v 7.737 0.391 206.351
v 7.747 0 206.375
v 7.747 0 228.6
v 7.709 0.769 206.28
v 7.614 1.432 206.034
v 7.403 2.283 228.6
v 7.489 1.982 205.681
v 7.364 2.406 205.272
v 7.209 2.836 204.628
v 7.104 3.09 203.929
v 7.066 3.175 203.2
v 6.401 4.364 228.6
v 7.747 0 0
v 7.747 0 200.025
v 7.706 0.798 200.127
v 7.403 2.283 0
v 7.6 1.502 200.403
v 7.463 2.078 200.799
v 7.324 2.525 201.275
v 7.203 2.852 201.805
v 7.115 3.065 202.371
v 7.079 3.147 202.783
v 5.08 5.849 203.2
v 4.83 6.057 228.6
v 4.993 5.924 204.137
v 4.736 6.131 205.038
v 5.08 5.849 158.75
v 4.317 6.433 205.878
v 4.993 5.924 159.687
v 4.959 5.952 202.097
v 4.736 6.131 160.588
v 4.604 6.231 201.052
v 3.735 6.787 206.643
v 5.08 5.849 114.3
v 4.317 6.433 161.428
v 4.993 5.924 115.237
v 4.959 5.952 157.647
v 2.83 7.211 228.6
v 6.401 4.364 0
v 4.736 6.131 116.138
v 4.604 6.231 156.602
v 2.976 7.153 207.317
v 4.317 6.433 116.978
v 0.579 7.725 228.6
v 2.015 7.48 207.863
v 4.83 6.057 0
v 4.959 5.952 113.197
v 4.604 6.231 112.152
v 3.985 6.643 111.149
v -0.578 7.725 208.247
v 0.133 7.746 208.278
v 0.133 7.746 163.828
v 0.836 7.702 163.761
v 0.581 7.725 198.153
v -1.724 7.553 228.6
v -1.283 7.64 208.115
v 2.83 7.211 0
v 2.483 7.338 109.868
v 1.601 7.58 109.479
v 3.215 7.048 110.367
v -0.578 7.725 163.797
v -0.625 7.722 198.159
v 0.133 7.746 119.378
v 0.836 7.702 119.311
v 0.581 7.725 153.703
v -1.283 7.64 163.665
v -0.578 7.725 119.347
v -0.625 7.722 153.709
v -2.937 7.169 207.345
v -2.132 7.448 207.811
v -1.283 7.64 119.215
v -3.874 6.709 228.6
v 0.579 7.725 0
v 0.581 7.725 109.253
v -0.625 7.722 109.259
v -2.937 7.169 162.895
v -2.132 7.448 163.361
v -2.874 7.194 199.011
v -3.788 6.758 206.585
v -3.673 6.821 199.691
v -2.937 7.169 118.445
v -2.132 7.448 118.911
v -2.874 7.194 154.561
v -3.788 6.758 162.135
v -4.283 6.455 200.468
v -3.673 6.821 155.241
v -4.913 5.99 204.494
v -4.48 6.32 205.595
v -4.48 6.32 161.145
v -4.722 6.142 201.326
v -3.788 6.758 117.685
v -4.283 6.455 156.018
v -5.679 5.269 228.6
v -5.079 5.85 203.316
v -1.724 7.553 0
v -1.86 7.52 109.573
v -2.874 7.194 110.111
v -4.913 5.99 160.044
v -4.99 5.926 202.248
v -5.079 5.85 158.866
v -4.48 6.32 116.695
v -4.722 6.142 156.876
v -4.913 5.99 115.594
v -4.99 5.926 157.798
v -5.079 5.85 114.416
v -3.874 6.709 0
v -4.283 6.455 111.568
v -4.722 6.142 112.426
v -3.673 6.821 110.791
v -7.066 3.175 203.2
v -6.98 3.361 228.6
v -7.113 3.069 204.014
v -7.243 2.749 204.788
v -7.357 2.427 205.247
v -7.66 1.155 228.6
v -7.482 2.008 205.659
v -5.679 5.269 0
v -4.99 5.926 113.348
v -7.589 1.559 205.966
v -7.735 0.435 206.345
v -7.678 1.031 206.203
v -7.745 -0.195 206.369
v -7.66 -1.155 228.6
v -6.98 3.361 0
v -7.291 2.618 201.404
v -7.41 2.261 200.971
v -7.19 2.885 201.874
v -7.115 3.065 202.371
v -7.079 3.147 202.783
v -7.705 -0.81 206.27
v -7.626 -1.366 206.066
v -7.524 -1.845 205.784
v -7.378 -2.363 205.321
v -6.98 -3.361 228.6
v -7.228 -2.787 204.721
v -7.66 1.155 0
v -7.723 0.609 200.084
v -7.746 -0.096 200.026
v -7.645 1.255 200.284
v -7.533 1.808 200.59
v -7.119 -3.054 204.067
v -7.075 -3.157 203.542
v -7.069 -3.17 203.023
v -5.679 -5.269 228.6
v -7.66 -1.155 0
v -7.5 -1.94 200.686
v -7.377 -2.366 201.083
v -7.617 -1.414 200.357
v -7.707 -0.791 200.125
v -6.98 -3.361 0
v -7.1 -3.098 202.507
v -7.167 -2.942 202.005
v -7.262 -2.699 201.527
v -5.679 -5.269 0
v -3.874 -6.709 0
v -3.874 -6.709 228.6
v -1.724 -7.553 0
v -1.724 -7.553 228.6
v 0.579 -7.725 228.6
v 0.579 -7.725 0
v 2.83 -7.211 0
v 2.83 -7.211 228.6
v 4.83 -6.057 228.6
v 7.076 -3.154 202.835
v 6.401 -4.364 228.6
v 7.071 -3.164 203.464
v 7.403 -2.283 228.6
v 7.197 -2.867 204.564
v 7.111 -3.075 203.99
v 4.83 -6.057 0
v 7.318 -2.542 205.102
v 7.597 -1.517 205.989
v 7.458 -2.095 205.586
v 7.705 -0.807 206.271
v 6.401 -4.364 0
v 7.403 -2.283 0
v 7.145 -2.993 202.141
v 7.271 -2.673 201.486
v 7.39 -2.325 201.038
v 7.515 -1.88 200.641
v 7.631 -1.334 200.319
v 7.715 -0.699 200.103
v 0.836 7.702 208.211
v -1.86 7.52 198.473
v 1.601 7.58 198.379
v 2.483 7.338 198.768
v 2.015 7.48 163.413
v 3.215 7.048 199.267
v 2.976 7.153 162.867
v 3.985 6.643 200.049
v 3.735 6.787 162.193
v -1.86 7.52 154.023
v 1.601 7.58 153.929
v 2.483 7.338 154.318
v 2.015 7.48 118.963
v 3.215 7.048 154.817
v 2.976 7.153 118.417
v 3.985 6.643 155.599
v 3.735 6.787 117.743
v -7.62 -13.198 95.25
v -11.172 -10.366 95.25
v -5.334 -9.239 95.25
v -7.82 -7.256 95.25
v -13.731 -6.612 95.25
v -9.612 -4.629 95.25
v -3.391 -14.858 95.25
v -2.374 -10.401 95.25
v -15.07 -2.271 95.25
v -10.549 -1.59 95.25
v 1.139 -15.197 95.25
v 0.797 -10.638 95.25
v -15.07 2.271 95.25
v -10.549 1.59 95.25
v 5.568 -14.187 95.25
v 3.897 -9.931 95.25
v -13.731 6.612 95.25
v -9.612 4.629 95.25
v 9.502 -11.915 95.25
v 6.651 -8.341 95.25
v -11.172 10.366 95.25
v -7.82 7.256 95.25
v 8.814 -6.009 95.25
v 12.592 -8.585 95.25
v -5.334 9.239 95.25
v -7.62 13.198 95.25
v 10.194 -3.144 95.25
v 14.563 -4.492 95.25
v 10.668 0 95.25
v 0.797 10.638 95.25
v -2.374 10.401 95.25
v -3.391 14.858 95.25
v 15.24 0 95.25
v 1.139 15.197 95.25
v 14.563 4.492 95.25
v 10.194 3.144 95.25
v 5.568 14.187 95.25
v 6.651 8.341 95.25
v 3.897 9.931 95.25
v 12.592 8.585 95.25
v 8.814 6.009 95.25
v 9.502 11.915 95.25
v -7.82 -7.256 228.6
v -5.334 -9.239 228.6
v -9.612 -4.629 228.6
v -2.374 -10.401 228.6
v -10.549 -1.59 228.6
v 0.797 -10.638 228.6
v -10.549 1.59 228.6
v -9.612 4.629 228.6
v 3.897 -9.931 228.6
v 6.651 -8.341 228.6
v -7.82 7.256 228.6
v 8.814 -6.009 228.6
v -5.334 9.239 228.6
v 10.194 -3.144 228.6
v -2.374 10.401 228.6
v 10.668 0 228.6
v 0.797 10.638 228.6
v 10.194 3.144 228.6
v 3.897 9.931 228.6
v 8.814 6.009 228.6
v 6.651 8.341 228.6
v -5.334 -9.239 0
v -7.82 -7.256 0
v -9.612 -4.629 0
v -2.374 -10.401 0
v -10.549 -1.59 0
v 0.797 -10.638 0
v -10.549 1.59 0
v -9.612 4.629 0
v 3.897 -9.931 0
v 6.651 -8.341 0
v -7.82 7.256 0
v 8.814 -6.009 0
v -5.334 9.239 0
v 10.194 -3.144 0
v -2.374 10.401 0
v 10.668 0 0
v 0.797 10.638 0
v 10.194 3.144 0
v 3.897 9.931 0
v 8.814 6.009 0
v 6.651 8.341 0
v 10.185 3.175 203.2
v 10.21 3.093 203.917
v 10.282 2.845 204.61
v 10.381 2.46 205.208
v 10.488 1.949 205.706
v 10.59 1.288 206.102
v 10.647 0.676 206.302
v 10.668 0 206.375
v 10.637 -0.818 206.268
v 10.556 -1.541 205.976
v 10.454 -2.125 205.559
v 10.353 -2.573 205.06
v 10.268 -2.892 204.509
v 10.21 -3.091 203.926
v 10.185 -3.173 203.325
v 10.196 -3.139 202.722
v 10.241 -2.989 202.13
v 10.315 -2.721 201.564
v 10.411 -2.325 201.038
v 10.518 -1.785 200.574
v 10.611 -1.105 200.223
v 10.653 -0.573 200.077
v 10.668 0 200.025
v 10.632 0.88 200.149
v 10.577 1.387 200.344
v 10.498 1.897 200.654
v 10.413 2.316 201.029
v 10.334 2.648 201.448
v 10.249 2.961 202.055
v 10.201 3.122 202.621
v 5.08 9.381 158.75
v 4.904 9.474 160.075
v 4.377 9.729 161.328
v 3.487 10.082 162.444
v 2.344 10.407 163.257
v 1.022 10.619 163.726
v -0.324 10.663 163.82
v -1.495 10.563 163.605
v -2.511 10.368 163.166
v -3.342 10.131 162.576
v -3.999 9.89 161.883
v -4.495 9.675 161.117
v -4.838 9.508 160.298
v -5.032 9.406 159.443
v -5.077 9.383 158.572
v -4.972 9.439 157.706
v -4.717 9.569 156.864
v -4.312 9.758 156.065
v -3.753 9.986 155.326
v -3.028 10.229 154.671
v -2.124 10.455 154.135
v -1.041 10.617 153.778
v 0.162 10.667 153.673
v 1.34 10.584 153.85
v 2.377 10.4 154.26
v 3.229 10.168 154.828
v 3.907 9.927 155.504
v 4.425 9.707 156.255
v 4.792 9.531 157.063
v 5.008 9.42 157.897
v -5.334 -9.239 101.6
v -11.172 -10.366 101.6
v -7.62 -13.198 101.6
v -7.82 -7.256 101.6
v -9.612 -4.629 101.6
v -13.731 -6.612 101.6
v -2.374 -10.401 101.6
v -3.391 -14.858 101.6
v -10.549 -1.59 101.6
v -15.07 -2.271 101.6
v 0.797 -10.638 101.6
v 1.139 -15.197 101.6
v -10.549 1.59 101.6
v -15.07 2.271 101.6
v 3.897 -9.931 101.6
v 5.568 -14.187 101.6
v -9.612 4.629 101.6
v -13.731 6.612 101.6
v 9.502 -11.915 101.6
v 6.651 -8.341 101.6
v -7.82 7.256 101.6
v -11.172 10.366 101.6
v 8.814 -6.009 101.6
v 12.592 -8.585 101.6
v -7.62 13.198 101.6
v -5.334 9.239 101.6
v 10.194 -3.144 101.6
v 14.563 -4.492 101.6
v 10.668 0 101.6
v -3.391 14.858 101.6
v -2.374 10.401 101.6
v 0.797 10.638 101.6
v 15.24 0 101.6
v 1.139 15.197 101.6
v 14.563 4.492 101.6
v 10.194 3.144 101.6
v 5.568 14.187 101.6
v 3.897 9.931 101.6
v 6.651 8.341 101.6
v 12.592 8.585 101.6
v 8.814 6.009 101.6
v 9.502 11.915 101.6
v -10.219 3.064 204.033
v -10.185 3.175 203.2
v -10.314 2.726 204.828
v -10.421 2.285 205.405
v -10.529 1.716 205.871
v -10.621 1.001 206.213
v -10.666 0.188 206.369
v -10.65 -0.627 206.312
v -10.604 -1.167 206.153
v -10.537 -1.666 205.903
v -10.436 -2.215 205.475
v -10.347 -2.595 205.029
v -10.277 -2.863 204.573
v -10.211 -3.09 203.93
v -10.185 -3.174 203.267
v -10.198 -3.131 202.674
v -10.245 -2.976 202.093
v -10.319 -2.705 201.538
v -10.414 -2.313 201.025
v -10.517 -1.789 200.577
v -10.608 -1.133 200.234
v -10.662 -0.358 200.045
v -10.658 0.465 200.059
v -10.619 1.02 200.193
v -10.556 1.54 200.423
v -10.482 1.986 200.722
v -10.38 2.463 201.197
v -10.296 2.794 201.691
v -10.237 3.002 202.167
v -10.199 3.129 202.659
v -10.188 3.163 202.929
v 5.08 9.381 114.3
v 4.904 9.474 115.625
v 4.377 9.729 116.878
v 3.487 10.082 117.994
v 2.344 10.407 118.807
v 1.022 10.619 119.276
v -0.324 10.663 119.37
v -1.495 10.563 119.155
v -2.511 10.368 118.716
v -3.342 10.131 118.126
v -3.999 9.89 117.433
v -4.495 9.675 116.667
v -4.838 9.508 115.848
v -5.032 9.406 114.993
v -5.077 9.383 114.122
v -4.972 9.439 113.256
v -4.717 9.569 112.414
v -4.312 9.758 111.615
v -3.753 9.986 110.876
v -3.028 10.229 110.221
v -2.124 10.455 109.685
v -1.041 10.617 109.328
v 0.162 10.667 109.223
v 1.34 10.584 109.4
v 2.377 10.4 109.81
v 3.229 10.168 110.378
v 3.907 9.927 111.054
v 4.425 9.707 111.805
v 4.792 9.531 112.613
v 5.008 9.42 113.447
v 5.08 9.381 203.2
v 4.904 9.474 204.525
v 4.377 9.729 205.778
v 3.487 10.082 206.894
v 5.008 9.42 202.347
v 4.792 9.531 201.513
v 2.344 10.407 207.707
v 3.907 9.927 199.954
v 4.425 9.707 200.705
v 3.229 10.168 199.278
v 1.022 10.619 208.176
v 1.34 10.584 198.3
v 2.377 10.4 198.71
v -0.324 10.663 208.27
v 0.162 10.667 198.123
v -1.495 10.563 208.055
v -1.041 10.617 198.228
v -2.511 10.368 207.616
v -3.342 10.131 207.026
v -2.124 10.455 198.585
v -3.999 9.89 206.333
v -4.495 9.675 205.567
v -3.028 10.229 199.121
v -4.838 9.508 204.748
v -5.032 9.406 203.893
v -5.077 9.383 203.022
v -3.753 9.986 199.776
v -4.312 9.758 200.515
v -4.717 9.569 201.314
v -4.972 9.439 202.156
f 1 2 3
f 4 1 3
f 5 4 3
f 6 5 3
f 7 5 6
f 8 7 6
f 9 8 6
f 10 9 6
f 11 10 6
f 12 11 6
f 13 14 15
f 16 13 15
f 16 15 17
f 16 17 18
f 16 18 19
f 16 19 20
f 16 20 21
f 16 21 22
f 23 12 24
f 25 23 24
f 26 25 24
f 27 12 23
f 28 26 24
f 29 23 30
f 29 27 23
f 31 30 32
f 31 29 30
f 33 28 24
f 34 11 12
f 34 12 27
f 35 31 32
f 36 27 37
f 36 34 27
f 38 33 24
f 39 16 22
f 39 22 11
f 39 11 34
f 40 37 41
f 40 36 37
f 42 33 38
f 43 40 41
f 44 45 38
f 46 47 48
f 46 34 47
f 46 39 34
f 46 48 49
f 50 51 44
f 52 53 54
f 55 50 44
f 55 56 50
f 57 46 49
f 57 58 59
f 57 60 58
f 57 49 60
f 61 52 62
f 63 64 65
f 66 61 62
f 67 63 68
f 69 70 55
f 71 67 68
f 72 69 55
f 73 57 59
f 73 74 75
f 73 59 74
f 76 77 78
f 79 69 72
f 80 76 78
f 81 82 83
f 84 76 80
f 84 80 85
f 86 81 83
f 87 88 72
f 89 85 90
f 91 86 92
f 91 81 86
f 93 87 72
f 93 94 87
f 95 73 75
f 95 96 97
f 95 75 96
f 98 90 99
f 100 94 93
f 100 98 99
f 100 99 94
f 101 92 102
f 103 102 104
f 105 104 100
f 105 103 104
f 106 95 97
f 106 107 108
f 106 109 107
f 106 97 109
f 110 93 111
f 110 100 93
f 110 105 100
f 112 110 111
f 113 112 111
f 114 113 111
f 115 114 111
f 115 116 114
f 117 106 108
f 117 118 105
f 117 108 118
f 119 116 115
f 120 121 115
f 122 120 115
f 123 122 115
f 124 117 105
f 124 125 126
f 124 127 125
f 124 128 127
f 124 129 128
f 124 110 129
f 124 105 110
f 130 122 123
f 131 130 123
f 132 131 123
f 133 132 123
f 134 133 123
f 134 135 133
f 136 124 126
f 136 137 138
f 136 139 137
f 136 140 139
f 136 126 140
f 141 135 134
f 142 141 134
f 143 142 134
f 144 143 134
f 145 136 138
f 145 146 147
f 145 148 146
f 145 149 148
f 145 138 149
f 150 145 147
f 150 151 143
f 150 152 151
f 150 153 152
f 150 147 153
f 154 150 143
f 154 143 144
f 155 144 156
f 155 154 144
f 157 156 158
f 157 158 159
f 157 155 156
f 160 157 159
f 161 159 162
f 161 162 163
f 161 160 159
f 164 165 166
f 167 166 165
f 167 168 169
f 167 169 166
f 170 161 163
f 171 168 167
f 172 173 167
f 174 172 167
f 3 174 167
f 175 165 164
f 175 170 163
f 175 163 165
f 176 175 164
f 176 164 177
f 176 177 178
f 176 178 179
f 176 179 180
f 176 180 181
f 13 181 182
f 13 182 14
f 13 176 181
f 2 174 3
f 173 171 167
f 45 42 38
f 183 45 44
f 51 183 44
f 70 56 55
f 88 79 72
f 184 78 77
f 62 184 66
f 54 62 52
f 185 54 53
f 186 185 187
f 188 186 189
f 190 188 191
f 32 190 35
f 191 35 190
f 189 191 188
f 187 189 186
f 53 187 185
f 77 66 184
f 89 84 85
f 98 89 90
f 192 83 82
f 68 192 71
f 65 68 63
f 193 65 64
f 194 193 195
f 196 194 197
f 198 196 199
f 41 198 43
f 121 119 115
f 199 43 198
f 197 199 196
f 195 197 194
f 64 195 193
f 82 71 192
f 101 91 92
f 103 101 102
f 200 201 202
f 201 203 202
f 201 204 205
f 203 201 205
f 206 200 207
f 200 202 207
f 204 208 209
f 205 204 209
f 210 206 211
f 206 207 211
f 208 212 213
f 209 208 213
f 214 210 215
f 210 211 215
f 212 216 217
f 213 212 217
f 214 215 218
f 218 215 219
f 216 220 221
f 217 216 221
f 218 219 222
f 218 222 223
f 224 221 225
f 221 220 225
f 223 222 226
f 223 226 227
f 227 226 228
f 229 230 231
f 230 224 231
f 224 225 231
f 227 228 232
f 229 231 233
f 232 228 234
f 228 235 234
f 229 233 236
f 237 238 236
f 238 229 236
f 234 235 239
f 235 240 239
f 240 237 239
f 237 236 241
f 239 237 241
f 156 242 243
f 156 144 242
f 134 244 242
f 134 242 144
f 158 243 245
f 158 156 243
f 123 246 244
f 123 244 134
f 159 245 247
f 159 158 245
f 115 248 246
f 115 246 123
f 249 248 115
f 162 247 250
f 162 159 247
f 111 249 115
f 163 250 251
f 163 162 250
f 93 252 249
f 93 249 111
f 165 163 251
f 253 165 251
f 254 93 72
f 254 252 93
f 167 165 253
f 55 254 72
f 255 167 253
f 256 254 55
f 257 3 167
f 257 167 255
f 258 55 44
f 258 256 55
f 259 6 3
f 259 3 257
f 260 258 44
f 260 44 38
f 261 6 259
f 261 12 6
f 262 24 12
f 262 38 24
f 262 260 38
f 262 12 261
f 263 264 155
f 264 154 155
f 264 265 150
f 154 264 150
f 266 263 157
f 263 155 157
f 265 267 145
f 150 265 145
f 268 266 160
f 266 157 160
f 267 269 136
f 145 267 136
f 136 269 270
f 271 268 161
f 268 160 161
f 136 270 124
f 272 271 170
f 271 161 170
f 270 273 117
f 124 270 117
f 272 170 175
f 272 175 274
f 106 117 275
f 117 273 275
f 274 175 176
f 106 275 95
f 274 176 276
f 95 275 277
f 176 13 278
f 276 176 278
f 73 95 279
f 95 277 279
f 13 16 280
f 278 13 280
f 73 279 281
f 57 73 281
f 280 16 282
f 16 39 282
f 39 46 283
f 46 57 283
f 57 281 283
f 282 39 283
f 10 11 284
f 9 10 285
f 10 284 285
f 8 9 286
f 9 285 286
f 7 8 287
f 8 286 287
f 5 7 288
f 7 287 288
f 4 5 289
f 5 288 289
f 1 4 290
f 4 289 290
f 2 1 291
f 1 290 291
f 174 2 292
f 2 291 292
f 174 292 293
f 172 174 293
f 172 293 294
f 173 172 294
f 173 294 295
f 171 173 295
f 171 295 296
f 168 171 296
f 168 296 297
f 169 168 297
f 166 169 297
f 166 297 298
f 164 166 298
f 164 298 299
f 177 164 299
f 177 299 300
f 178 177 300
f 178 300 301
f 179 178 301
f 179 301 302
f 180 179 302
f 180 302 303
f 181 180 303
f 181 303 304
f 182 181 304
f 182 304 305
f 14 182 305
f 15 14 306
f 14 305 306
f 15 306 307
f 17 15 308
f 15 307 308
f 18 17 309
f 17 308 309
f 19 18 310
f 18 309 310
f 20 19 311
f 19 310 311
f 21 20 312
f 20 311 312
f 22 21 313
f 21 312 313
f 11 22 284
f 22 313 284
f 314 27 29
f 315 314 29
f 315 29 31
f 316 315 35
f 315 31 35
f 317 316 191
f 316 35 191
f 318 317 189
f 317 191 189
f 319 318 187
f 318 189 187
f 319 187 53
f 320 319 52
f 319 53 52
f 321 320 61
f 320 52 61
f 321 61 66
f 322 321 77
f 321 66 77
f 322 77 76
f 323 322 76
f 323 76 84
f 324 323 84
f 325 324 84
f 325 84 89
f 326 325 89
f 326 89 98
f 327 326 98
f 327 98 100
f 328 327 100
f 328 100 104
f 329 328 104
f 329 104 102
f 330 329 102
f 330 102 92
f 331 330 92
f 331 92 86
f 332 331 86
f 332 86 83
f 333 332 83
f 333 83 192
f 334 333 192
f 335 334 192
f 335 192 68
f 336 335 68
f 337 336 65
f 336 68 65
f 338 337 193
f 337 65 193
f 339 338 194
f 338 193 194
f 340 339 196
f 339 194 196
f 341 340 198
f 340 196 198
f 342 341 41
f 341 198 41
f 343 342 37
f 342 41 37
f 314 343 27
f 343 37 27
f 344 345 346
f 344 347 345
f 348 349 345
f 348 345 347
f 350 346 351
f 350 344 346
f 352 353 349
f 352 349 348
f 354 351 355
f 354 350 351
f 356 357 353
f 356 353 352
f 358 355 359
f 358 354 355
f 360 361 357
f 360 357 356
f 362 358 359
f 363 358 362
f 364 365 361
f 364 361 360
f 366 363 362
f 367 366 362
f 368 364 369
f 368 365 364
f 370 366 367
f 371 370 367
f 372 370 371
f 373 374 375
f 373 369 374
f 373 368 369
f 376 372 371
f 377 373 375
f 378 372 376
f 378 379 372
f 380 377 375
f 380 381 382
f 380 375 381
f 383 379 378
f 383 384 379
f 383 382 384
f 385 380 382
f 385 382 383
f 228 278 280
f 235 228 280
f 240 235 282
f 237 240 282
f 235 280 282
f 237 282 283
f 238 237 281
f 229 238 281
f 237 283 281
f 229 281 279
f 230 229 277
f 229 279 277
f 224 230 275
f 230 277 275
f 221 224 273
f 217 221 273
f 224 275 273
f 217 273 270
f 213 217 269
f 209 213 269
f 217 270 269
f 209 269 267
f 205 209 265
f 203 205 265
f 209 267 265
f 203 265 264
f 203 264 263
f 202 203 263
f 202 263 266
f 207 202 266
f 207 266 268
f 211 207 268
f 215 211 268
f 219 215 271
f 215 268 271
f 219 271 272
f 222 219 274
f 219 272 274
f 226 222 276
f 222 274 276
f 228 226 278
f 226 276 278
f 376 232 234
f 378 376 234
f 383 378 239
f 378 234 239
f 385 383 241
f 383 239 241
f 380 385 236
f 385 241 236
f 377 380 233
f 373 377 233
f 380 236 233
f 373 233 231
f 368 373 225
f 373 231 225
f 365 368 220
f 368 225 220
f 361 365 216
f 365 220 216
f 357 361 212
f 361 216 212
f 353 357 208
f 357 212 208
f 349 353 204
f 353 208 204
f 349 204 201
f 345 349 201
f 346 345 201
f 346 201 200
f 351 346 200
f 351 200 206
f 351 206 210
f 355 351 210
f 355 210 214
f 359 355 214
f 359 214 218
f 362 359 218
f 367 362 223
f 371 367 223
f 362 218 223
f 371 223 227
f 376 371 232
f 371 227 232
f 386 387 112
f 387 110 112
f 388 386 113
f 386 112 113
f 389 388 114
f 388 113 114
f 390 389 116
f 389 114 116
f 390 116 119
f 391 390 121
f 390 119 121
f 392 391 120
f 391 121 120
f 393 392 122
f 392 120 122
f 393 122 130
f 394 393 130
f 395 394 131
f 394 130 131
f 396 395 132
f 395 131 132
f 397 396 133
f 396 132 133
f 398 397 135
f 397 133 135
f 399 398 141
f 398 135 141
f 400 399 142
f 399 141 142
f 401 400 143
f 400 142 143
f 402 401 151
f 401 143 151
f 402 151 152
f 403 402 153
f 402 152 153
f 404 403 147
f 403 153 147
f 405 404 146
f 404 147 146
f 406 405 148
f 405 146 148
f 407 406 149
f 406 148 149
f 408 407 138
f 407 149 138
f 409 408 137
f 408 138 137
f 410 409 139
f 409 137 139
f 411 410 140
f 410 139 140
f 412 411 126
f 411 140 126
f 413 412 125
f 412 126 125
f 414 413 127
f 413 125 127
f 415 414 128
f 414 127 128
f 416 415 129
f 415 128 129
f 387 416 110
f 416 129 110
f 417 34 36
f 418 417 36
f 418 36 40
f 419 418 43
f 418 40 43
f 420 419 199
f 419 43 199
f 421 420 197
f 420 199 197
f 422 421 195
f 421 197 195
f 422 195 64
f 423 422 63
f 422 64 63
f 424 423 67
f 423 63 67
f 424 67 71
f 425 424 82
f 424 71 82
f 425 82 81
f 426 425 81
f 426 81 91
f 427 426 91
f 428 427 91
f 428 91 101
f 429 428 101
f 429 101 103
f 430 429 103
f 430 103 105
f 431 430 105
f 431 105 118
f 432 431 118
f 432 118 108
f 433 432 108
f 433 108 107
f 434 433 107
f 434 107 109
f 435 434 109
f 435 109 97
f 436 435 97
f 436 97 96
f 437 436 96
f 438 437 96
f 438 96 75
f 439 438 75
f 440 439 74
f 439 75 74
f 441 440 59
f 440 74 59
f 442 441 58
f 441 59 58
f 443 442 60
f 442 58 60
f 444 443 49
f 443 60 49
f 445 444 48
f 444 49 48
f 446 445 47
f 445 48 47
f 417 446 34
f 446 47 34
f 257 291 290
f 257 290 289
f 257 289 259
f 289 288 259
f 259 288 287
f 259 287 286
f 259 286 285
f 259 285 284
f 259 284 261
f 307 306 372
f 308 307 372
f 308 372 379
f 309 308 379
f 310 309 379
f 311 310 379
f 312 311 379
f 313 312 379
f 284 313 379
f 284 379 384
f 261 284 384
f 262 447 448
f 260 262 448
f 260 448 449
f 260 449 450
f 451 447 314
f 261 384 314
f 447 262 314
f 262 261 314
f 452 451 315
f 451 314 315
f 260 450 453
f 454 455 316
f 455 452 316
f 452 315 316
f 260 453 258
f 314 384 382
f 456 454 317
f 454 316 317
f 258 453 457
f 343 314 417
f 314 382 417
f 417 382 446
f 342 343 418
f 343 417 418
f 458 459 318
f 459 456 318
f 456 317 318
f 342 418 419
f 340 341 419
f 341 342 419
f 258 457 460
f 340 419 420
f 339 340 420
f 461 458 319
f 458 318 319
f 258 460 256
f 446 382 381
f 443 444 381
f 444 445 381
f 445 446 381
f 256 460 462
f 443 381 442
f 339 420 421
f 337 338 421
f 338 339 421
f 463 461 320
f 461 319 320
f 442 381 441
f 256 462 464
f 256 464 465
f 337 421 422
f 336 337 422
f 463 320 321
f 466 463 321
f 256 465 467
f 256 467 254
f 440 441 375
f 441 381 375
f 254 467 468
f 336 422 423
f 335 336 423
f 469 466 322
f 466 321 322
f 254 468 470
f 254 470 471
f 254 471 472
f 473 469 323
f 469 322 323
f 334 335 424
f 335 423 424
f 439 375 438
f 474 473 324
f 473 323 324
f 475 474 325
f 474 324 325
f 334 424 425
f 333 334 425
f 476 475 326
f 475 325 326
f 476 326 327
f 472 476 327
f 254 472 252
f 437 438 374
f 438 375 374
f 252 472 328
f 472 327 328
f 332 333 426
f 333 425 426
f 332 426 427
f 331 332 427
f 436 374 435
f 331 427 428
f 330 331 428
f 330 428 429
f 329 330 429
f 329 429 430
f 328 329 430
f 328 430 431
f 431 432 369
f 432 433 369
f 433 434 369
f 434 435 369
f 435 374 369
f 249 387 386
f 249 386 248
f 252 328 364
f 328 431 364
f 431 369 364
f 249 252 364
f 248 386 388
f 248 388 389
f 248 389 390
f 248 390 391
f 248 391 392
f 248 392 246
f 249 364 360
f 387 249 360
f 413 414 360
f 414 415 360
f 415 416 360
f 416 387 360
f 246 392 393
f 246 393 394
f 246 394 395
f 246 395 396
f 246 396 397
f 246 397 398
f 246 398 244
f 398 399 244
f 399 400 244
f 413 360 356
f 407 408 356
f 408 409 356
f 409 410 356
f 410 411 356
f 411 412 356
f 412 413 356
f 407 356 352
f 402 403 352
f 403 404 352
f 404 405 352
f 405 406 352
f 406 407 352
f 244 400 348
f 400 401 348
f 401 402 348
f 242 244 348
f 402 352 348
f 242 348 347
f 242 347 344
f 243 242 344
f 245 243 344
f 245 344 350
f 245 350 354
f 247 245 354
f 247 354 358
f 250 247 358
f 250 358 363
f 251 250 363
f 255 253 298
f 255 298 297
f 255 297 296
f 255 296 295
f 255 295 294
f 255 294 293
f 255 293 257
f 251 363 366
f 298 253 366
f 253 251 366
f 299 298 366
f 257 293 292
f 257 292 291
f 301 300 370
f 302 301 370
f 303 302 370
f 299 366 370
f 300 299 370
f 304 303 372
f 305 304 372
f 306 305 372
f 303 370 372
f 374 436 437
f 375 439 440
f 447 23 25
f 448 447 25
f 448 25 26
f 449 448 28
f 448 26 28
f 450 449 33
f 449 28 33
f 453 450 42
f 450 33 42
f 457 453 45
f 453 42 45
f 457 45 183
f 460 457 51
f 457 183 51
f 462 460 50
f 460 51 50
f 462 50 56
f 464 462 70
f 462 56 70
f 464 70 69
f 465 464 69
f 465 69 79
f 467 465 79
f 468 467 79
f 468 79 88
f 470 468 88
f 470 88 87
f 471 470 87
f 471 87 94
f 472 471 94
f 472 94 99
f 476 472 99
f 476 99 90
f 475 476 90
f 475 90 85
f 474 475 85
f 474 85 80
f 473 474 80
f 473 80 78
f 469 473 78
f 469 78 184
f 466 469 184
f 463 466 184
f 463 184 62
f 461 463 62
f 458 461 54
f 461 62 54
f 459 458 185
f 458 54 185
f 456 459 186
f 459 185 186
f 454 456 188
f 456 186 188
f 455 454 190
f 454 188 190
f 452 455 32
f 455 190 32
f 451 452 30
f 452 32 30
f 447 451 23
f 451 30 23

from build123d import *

# Parameters (mm, degrees)
F0_R     = 10.668
F0_R_2   = 7.747
F1_DEPTH = 95.25
F2_R     = 15.24
F2_R_2   = 10.668
F2_R_3   = 7.747
F3_DEPTH = 6.35
F4_R     = 10.668
F4_R_2   = 7.747
F5_DEPTH = 127
F6_R     = 3.175
F7_DEPTH = 12.7
F8_R     = 5.08
F9_DEPTH = 25.4


with BuildPart() as f1:
    # F0 (on Top) → F1 (new body)
    with BuildSketch(Plane.XY):
        Circle(F0_R)
        Circle(F0_R_2, mode=Mode.SUBTRACT)
    extrude(amount=F1_DEPTH)

    # F2 (on face) → F3 (join)
    with BuildSketch(Plane.XY.offset(95.25)):
        Circle(F2_R)
        Circle(F2_R_2, mode=Mode.SUBTRACT)
        Circle(F2_R_2)
        Circle(F2_R_3, mode=Mode.SUBTRACT)
    extrude(amount=F3_DEPTH)

    # F4 (on face) → F5 (join)
    with BuildSketch(Plane.XY.offset(101.6)):
        Circle(F4_R)
        Circle(F4_R_2, mode=Mode.SUBTRACT)
    extrude(amount=F5_DEPTH)

    # F6 (on Right) → F7 (cut, symmetric)
    with BuildSketch(Plane.YZ):
        with Locations((0, 203.2)):
            Circle(F6_R)
    extrude(amount=F7_DEPTH, both=True, mode=Mode.SUBTRACT)

    # F8 (on Front) → F9 (cut)
    with BuildSketch(Plane.XZ):
        with Locations((0, 114.3)):
            Circle(F8_R)
        with Locations((0, 158.75)):
            Circle(F8_R)
        with Locations((0, 203.2)):
            Circle(F8_R)
    extrude(amount=-F9_DEPTH, mode=Mode.SUBTRACT)


solid = f1.part
